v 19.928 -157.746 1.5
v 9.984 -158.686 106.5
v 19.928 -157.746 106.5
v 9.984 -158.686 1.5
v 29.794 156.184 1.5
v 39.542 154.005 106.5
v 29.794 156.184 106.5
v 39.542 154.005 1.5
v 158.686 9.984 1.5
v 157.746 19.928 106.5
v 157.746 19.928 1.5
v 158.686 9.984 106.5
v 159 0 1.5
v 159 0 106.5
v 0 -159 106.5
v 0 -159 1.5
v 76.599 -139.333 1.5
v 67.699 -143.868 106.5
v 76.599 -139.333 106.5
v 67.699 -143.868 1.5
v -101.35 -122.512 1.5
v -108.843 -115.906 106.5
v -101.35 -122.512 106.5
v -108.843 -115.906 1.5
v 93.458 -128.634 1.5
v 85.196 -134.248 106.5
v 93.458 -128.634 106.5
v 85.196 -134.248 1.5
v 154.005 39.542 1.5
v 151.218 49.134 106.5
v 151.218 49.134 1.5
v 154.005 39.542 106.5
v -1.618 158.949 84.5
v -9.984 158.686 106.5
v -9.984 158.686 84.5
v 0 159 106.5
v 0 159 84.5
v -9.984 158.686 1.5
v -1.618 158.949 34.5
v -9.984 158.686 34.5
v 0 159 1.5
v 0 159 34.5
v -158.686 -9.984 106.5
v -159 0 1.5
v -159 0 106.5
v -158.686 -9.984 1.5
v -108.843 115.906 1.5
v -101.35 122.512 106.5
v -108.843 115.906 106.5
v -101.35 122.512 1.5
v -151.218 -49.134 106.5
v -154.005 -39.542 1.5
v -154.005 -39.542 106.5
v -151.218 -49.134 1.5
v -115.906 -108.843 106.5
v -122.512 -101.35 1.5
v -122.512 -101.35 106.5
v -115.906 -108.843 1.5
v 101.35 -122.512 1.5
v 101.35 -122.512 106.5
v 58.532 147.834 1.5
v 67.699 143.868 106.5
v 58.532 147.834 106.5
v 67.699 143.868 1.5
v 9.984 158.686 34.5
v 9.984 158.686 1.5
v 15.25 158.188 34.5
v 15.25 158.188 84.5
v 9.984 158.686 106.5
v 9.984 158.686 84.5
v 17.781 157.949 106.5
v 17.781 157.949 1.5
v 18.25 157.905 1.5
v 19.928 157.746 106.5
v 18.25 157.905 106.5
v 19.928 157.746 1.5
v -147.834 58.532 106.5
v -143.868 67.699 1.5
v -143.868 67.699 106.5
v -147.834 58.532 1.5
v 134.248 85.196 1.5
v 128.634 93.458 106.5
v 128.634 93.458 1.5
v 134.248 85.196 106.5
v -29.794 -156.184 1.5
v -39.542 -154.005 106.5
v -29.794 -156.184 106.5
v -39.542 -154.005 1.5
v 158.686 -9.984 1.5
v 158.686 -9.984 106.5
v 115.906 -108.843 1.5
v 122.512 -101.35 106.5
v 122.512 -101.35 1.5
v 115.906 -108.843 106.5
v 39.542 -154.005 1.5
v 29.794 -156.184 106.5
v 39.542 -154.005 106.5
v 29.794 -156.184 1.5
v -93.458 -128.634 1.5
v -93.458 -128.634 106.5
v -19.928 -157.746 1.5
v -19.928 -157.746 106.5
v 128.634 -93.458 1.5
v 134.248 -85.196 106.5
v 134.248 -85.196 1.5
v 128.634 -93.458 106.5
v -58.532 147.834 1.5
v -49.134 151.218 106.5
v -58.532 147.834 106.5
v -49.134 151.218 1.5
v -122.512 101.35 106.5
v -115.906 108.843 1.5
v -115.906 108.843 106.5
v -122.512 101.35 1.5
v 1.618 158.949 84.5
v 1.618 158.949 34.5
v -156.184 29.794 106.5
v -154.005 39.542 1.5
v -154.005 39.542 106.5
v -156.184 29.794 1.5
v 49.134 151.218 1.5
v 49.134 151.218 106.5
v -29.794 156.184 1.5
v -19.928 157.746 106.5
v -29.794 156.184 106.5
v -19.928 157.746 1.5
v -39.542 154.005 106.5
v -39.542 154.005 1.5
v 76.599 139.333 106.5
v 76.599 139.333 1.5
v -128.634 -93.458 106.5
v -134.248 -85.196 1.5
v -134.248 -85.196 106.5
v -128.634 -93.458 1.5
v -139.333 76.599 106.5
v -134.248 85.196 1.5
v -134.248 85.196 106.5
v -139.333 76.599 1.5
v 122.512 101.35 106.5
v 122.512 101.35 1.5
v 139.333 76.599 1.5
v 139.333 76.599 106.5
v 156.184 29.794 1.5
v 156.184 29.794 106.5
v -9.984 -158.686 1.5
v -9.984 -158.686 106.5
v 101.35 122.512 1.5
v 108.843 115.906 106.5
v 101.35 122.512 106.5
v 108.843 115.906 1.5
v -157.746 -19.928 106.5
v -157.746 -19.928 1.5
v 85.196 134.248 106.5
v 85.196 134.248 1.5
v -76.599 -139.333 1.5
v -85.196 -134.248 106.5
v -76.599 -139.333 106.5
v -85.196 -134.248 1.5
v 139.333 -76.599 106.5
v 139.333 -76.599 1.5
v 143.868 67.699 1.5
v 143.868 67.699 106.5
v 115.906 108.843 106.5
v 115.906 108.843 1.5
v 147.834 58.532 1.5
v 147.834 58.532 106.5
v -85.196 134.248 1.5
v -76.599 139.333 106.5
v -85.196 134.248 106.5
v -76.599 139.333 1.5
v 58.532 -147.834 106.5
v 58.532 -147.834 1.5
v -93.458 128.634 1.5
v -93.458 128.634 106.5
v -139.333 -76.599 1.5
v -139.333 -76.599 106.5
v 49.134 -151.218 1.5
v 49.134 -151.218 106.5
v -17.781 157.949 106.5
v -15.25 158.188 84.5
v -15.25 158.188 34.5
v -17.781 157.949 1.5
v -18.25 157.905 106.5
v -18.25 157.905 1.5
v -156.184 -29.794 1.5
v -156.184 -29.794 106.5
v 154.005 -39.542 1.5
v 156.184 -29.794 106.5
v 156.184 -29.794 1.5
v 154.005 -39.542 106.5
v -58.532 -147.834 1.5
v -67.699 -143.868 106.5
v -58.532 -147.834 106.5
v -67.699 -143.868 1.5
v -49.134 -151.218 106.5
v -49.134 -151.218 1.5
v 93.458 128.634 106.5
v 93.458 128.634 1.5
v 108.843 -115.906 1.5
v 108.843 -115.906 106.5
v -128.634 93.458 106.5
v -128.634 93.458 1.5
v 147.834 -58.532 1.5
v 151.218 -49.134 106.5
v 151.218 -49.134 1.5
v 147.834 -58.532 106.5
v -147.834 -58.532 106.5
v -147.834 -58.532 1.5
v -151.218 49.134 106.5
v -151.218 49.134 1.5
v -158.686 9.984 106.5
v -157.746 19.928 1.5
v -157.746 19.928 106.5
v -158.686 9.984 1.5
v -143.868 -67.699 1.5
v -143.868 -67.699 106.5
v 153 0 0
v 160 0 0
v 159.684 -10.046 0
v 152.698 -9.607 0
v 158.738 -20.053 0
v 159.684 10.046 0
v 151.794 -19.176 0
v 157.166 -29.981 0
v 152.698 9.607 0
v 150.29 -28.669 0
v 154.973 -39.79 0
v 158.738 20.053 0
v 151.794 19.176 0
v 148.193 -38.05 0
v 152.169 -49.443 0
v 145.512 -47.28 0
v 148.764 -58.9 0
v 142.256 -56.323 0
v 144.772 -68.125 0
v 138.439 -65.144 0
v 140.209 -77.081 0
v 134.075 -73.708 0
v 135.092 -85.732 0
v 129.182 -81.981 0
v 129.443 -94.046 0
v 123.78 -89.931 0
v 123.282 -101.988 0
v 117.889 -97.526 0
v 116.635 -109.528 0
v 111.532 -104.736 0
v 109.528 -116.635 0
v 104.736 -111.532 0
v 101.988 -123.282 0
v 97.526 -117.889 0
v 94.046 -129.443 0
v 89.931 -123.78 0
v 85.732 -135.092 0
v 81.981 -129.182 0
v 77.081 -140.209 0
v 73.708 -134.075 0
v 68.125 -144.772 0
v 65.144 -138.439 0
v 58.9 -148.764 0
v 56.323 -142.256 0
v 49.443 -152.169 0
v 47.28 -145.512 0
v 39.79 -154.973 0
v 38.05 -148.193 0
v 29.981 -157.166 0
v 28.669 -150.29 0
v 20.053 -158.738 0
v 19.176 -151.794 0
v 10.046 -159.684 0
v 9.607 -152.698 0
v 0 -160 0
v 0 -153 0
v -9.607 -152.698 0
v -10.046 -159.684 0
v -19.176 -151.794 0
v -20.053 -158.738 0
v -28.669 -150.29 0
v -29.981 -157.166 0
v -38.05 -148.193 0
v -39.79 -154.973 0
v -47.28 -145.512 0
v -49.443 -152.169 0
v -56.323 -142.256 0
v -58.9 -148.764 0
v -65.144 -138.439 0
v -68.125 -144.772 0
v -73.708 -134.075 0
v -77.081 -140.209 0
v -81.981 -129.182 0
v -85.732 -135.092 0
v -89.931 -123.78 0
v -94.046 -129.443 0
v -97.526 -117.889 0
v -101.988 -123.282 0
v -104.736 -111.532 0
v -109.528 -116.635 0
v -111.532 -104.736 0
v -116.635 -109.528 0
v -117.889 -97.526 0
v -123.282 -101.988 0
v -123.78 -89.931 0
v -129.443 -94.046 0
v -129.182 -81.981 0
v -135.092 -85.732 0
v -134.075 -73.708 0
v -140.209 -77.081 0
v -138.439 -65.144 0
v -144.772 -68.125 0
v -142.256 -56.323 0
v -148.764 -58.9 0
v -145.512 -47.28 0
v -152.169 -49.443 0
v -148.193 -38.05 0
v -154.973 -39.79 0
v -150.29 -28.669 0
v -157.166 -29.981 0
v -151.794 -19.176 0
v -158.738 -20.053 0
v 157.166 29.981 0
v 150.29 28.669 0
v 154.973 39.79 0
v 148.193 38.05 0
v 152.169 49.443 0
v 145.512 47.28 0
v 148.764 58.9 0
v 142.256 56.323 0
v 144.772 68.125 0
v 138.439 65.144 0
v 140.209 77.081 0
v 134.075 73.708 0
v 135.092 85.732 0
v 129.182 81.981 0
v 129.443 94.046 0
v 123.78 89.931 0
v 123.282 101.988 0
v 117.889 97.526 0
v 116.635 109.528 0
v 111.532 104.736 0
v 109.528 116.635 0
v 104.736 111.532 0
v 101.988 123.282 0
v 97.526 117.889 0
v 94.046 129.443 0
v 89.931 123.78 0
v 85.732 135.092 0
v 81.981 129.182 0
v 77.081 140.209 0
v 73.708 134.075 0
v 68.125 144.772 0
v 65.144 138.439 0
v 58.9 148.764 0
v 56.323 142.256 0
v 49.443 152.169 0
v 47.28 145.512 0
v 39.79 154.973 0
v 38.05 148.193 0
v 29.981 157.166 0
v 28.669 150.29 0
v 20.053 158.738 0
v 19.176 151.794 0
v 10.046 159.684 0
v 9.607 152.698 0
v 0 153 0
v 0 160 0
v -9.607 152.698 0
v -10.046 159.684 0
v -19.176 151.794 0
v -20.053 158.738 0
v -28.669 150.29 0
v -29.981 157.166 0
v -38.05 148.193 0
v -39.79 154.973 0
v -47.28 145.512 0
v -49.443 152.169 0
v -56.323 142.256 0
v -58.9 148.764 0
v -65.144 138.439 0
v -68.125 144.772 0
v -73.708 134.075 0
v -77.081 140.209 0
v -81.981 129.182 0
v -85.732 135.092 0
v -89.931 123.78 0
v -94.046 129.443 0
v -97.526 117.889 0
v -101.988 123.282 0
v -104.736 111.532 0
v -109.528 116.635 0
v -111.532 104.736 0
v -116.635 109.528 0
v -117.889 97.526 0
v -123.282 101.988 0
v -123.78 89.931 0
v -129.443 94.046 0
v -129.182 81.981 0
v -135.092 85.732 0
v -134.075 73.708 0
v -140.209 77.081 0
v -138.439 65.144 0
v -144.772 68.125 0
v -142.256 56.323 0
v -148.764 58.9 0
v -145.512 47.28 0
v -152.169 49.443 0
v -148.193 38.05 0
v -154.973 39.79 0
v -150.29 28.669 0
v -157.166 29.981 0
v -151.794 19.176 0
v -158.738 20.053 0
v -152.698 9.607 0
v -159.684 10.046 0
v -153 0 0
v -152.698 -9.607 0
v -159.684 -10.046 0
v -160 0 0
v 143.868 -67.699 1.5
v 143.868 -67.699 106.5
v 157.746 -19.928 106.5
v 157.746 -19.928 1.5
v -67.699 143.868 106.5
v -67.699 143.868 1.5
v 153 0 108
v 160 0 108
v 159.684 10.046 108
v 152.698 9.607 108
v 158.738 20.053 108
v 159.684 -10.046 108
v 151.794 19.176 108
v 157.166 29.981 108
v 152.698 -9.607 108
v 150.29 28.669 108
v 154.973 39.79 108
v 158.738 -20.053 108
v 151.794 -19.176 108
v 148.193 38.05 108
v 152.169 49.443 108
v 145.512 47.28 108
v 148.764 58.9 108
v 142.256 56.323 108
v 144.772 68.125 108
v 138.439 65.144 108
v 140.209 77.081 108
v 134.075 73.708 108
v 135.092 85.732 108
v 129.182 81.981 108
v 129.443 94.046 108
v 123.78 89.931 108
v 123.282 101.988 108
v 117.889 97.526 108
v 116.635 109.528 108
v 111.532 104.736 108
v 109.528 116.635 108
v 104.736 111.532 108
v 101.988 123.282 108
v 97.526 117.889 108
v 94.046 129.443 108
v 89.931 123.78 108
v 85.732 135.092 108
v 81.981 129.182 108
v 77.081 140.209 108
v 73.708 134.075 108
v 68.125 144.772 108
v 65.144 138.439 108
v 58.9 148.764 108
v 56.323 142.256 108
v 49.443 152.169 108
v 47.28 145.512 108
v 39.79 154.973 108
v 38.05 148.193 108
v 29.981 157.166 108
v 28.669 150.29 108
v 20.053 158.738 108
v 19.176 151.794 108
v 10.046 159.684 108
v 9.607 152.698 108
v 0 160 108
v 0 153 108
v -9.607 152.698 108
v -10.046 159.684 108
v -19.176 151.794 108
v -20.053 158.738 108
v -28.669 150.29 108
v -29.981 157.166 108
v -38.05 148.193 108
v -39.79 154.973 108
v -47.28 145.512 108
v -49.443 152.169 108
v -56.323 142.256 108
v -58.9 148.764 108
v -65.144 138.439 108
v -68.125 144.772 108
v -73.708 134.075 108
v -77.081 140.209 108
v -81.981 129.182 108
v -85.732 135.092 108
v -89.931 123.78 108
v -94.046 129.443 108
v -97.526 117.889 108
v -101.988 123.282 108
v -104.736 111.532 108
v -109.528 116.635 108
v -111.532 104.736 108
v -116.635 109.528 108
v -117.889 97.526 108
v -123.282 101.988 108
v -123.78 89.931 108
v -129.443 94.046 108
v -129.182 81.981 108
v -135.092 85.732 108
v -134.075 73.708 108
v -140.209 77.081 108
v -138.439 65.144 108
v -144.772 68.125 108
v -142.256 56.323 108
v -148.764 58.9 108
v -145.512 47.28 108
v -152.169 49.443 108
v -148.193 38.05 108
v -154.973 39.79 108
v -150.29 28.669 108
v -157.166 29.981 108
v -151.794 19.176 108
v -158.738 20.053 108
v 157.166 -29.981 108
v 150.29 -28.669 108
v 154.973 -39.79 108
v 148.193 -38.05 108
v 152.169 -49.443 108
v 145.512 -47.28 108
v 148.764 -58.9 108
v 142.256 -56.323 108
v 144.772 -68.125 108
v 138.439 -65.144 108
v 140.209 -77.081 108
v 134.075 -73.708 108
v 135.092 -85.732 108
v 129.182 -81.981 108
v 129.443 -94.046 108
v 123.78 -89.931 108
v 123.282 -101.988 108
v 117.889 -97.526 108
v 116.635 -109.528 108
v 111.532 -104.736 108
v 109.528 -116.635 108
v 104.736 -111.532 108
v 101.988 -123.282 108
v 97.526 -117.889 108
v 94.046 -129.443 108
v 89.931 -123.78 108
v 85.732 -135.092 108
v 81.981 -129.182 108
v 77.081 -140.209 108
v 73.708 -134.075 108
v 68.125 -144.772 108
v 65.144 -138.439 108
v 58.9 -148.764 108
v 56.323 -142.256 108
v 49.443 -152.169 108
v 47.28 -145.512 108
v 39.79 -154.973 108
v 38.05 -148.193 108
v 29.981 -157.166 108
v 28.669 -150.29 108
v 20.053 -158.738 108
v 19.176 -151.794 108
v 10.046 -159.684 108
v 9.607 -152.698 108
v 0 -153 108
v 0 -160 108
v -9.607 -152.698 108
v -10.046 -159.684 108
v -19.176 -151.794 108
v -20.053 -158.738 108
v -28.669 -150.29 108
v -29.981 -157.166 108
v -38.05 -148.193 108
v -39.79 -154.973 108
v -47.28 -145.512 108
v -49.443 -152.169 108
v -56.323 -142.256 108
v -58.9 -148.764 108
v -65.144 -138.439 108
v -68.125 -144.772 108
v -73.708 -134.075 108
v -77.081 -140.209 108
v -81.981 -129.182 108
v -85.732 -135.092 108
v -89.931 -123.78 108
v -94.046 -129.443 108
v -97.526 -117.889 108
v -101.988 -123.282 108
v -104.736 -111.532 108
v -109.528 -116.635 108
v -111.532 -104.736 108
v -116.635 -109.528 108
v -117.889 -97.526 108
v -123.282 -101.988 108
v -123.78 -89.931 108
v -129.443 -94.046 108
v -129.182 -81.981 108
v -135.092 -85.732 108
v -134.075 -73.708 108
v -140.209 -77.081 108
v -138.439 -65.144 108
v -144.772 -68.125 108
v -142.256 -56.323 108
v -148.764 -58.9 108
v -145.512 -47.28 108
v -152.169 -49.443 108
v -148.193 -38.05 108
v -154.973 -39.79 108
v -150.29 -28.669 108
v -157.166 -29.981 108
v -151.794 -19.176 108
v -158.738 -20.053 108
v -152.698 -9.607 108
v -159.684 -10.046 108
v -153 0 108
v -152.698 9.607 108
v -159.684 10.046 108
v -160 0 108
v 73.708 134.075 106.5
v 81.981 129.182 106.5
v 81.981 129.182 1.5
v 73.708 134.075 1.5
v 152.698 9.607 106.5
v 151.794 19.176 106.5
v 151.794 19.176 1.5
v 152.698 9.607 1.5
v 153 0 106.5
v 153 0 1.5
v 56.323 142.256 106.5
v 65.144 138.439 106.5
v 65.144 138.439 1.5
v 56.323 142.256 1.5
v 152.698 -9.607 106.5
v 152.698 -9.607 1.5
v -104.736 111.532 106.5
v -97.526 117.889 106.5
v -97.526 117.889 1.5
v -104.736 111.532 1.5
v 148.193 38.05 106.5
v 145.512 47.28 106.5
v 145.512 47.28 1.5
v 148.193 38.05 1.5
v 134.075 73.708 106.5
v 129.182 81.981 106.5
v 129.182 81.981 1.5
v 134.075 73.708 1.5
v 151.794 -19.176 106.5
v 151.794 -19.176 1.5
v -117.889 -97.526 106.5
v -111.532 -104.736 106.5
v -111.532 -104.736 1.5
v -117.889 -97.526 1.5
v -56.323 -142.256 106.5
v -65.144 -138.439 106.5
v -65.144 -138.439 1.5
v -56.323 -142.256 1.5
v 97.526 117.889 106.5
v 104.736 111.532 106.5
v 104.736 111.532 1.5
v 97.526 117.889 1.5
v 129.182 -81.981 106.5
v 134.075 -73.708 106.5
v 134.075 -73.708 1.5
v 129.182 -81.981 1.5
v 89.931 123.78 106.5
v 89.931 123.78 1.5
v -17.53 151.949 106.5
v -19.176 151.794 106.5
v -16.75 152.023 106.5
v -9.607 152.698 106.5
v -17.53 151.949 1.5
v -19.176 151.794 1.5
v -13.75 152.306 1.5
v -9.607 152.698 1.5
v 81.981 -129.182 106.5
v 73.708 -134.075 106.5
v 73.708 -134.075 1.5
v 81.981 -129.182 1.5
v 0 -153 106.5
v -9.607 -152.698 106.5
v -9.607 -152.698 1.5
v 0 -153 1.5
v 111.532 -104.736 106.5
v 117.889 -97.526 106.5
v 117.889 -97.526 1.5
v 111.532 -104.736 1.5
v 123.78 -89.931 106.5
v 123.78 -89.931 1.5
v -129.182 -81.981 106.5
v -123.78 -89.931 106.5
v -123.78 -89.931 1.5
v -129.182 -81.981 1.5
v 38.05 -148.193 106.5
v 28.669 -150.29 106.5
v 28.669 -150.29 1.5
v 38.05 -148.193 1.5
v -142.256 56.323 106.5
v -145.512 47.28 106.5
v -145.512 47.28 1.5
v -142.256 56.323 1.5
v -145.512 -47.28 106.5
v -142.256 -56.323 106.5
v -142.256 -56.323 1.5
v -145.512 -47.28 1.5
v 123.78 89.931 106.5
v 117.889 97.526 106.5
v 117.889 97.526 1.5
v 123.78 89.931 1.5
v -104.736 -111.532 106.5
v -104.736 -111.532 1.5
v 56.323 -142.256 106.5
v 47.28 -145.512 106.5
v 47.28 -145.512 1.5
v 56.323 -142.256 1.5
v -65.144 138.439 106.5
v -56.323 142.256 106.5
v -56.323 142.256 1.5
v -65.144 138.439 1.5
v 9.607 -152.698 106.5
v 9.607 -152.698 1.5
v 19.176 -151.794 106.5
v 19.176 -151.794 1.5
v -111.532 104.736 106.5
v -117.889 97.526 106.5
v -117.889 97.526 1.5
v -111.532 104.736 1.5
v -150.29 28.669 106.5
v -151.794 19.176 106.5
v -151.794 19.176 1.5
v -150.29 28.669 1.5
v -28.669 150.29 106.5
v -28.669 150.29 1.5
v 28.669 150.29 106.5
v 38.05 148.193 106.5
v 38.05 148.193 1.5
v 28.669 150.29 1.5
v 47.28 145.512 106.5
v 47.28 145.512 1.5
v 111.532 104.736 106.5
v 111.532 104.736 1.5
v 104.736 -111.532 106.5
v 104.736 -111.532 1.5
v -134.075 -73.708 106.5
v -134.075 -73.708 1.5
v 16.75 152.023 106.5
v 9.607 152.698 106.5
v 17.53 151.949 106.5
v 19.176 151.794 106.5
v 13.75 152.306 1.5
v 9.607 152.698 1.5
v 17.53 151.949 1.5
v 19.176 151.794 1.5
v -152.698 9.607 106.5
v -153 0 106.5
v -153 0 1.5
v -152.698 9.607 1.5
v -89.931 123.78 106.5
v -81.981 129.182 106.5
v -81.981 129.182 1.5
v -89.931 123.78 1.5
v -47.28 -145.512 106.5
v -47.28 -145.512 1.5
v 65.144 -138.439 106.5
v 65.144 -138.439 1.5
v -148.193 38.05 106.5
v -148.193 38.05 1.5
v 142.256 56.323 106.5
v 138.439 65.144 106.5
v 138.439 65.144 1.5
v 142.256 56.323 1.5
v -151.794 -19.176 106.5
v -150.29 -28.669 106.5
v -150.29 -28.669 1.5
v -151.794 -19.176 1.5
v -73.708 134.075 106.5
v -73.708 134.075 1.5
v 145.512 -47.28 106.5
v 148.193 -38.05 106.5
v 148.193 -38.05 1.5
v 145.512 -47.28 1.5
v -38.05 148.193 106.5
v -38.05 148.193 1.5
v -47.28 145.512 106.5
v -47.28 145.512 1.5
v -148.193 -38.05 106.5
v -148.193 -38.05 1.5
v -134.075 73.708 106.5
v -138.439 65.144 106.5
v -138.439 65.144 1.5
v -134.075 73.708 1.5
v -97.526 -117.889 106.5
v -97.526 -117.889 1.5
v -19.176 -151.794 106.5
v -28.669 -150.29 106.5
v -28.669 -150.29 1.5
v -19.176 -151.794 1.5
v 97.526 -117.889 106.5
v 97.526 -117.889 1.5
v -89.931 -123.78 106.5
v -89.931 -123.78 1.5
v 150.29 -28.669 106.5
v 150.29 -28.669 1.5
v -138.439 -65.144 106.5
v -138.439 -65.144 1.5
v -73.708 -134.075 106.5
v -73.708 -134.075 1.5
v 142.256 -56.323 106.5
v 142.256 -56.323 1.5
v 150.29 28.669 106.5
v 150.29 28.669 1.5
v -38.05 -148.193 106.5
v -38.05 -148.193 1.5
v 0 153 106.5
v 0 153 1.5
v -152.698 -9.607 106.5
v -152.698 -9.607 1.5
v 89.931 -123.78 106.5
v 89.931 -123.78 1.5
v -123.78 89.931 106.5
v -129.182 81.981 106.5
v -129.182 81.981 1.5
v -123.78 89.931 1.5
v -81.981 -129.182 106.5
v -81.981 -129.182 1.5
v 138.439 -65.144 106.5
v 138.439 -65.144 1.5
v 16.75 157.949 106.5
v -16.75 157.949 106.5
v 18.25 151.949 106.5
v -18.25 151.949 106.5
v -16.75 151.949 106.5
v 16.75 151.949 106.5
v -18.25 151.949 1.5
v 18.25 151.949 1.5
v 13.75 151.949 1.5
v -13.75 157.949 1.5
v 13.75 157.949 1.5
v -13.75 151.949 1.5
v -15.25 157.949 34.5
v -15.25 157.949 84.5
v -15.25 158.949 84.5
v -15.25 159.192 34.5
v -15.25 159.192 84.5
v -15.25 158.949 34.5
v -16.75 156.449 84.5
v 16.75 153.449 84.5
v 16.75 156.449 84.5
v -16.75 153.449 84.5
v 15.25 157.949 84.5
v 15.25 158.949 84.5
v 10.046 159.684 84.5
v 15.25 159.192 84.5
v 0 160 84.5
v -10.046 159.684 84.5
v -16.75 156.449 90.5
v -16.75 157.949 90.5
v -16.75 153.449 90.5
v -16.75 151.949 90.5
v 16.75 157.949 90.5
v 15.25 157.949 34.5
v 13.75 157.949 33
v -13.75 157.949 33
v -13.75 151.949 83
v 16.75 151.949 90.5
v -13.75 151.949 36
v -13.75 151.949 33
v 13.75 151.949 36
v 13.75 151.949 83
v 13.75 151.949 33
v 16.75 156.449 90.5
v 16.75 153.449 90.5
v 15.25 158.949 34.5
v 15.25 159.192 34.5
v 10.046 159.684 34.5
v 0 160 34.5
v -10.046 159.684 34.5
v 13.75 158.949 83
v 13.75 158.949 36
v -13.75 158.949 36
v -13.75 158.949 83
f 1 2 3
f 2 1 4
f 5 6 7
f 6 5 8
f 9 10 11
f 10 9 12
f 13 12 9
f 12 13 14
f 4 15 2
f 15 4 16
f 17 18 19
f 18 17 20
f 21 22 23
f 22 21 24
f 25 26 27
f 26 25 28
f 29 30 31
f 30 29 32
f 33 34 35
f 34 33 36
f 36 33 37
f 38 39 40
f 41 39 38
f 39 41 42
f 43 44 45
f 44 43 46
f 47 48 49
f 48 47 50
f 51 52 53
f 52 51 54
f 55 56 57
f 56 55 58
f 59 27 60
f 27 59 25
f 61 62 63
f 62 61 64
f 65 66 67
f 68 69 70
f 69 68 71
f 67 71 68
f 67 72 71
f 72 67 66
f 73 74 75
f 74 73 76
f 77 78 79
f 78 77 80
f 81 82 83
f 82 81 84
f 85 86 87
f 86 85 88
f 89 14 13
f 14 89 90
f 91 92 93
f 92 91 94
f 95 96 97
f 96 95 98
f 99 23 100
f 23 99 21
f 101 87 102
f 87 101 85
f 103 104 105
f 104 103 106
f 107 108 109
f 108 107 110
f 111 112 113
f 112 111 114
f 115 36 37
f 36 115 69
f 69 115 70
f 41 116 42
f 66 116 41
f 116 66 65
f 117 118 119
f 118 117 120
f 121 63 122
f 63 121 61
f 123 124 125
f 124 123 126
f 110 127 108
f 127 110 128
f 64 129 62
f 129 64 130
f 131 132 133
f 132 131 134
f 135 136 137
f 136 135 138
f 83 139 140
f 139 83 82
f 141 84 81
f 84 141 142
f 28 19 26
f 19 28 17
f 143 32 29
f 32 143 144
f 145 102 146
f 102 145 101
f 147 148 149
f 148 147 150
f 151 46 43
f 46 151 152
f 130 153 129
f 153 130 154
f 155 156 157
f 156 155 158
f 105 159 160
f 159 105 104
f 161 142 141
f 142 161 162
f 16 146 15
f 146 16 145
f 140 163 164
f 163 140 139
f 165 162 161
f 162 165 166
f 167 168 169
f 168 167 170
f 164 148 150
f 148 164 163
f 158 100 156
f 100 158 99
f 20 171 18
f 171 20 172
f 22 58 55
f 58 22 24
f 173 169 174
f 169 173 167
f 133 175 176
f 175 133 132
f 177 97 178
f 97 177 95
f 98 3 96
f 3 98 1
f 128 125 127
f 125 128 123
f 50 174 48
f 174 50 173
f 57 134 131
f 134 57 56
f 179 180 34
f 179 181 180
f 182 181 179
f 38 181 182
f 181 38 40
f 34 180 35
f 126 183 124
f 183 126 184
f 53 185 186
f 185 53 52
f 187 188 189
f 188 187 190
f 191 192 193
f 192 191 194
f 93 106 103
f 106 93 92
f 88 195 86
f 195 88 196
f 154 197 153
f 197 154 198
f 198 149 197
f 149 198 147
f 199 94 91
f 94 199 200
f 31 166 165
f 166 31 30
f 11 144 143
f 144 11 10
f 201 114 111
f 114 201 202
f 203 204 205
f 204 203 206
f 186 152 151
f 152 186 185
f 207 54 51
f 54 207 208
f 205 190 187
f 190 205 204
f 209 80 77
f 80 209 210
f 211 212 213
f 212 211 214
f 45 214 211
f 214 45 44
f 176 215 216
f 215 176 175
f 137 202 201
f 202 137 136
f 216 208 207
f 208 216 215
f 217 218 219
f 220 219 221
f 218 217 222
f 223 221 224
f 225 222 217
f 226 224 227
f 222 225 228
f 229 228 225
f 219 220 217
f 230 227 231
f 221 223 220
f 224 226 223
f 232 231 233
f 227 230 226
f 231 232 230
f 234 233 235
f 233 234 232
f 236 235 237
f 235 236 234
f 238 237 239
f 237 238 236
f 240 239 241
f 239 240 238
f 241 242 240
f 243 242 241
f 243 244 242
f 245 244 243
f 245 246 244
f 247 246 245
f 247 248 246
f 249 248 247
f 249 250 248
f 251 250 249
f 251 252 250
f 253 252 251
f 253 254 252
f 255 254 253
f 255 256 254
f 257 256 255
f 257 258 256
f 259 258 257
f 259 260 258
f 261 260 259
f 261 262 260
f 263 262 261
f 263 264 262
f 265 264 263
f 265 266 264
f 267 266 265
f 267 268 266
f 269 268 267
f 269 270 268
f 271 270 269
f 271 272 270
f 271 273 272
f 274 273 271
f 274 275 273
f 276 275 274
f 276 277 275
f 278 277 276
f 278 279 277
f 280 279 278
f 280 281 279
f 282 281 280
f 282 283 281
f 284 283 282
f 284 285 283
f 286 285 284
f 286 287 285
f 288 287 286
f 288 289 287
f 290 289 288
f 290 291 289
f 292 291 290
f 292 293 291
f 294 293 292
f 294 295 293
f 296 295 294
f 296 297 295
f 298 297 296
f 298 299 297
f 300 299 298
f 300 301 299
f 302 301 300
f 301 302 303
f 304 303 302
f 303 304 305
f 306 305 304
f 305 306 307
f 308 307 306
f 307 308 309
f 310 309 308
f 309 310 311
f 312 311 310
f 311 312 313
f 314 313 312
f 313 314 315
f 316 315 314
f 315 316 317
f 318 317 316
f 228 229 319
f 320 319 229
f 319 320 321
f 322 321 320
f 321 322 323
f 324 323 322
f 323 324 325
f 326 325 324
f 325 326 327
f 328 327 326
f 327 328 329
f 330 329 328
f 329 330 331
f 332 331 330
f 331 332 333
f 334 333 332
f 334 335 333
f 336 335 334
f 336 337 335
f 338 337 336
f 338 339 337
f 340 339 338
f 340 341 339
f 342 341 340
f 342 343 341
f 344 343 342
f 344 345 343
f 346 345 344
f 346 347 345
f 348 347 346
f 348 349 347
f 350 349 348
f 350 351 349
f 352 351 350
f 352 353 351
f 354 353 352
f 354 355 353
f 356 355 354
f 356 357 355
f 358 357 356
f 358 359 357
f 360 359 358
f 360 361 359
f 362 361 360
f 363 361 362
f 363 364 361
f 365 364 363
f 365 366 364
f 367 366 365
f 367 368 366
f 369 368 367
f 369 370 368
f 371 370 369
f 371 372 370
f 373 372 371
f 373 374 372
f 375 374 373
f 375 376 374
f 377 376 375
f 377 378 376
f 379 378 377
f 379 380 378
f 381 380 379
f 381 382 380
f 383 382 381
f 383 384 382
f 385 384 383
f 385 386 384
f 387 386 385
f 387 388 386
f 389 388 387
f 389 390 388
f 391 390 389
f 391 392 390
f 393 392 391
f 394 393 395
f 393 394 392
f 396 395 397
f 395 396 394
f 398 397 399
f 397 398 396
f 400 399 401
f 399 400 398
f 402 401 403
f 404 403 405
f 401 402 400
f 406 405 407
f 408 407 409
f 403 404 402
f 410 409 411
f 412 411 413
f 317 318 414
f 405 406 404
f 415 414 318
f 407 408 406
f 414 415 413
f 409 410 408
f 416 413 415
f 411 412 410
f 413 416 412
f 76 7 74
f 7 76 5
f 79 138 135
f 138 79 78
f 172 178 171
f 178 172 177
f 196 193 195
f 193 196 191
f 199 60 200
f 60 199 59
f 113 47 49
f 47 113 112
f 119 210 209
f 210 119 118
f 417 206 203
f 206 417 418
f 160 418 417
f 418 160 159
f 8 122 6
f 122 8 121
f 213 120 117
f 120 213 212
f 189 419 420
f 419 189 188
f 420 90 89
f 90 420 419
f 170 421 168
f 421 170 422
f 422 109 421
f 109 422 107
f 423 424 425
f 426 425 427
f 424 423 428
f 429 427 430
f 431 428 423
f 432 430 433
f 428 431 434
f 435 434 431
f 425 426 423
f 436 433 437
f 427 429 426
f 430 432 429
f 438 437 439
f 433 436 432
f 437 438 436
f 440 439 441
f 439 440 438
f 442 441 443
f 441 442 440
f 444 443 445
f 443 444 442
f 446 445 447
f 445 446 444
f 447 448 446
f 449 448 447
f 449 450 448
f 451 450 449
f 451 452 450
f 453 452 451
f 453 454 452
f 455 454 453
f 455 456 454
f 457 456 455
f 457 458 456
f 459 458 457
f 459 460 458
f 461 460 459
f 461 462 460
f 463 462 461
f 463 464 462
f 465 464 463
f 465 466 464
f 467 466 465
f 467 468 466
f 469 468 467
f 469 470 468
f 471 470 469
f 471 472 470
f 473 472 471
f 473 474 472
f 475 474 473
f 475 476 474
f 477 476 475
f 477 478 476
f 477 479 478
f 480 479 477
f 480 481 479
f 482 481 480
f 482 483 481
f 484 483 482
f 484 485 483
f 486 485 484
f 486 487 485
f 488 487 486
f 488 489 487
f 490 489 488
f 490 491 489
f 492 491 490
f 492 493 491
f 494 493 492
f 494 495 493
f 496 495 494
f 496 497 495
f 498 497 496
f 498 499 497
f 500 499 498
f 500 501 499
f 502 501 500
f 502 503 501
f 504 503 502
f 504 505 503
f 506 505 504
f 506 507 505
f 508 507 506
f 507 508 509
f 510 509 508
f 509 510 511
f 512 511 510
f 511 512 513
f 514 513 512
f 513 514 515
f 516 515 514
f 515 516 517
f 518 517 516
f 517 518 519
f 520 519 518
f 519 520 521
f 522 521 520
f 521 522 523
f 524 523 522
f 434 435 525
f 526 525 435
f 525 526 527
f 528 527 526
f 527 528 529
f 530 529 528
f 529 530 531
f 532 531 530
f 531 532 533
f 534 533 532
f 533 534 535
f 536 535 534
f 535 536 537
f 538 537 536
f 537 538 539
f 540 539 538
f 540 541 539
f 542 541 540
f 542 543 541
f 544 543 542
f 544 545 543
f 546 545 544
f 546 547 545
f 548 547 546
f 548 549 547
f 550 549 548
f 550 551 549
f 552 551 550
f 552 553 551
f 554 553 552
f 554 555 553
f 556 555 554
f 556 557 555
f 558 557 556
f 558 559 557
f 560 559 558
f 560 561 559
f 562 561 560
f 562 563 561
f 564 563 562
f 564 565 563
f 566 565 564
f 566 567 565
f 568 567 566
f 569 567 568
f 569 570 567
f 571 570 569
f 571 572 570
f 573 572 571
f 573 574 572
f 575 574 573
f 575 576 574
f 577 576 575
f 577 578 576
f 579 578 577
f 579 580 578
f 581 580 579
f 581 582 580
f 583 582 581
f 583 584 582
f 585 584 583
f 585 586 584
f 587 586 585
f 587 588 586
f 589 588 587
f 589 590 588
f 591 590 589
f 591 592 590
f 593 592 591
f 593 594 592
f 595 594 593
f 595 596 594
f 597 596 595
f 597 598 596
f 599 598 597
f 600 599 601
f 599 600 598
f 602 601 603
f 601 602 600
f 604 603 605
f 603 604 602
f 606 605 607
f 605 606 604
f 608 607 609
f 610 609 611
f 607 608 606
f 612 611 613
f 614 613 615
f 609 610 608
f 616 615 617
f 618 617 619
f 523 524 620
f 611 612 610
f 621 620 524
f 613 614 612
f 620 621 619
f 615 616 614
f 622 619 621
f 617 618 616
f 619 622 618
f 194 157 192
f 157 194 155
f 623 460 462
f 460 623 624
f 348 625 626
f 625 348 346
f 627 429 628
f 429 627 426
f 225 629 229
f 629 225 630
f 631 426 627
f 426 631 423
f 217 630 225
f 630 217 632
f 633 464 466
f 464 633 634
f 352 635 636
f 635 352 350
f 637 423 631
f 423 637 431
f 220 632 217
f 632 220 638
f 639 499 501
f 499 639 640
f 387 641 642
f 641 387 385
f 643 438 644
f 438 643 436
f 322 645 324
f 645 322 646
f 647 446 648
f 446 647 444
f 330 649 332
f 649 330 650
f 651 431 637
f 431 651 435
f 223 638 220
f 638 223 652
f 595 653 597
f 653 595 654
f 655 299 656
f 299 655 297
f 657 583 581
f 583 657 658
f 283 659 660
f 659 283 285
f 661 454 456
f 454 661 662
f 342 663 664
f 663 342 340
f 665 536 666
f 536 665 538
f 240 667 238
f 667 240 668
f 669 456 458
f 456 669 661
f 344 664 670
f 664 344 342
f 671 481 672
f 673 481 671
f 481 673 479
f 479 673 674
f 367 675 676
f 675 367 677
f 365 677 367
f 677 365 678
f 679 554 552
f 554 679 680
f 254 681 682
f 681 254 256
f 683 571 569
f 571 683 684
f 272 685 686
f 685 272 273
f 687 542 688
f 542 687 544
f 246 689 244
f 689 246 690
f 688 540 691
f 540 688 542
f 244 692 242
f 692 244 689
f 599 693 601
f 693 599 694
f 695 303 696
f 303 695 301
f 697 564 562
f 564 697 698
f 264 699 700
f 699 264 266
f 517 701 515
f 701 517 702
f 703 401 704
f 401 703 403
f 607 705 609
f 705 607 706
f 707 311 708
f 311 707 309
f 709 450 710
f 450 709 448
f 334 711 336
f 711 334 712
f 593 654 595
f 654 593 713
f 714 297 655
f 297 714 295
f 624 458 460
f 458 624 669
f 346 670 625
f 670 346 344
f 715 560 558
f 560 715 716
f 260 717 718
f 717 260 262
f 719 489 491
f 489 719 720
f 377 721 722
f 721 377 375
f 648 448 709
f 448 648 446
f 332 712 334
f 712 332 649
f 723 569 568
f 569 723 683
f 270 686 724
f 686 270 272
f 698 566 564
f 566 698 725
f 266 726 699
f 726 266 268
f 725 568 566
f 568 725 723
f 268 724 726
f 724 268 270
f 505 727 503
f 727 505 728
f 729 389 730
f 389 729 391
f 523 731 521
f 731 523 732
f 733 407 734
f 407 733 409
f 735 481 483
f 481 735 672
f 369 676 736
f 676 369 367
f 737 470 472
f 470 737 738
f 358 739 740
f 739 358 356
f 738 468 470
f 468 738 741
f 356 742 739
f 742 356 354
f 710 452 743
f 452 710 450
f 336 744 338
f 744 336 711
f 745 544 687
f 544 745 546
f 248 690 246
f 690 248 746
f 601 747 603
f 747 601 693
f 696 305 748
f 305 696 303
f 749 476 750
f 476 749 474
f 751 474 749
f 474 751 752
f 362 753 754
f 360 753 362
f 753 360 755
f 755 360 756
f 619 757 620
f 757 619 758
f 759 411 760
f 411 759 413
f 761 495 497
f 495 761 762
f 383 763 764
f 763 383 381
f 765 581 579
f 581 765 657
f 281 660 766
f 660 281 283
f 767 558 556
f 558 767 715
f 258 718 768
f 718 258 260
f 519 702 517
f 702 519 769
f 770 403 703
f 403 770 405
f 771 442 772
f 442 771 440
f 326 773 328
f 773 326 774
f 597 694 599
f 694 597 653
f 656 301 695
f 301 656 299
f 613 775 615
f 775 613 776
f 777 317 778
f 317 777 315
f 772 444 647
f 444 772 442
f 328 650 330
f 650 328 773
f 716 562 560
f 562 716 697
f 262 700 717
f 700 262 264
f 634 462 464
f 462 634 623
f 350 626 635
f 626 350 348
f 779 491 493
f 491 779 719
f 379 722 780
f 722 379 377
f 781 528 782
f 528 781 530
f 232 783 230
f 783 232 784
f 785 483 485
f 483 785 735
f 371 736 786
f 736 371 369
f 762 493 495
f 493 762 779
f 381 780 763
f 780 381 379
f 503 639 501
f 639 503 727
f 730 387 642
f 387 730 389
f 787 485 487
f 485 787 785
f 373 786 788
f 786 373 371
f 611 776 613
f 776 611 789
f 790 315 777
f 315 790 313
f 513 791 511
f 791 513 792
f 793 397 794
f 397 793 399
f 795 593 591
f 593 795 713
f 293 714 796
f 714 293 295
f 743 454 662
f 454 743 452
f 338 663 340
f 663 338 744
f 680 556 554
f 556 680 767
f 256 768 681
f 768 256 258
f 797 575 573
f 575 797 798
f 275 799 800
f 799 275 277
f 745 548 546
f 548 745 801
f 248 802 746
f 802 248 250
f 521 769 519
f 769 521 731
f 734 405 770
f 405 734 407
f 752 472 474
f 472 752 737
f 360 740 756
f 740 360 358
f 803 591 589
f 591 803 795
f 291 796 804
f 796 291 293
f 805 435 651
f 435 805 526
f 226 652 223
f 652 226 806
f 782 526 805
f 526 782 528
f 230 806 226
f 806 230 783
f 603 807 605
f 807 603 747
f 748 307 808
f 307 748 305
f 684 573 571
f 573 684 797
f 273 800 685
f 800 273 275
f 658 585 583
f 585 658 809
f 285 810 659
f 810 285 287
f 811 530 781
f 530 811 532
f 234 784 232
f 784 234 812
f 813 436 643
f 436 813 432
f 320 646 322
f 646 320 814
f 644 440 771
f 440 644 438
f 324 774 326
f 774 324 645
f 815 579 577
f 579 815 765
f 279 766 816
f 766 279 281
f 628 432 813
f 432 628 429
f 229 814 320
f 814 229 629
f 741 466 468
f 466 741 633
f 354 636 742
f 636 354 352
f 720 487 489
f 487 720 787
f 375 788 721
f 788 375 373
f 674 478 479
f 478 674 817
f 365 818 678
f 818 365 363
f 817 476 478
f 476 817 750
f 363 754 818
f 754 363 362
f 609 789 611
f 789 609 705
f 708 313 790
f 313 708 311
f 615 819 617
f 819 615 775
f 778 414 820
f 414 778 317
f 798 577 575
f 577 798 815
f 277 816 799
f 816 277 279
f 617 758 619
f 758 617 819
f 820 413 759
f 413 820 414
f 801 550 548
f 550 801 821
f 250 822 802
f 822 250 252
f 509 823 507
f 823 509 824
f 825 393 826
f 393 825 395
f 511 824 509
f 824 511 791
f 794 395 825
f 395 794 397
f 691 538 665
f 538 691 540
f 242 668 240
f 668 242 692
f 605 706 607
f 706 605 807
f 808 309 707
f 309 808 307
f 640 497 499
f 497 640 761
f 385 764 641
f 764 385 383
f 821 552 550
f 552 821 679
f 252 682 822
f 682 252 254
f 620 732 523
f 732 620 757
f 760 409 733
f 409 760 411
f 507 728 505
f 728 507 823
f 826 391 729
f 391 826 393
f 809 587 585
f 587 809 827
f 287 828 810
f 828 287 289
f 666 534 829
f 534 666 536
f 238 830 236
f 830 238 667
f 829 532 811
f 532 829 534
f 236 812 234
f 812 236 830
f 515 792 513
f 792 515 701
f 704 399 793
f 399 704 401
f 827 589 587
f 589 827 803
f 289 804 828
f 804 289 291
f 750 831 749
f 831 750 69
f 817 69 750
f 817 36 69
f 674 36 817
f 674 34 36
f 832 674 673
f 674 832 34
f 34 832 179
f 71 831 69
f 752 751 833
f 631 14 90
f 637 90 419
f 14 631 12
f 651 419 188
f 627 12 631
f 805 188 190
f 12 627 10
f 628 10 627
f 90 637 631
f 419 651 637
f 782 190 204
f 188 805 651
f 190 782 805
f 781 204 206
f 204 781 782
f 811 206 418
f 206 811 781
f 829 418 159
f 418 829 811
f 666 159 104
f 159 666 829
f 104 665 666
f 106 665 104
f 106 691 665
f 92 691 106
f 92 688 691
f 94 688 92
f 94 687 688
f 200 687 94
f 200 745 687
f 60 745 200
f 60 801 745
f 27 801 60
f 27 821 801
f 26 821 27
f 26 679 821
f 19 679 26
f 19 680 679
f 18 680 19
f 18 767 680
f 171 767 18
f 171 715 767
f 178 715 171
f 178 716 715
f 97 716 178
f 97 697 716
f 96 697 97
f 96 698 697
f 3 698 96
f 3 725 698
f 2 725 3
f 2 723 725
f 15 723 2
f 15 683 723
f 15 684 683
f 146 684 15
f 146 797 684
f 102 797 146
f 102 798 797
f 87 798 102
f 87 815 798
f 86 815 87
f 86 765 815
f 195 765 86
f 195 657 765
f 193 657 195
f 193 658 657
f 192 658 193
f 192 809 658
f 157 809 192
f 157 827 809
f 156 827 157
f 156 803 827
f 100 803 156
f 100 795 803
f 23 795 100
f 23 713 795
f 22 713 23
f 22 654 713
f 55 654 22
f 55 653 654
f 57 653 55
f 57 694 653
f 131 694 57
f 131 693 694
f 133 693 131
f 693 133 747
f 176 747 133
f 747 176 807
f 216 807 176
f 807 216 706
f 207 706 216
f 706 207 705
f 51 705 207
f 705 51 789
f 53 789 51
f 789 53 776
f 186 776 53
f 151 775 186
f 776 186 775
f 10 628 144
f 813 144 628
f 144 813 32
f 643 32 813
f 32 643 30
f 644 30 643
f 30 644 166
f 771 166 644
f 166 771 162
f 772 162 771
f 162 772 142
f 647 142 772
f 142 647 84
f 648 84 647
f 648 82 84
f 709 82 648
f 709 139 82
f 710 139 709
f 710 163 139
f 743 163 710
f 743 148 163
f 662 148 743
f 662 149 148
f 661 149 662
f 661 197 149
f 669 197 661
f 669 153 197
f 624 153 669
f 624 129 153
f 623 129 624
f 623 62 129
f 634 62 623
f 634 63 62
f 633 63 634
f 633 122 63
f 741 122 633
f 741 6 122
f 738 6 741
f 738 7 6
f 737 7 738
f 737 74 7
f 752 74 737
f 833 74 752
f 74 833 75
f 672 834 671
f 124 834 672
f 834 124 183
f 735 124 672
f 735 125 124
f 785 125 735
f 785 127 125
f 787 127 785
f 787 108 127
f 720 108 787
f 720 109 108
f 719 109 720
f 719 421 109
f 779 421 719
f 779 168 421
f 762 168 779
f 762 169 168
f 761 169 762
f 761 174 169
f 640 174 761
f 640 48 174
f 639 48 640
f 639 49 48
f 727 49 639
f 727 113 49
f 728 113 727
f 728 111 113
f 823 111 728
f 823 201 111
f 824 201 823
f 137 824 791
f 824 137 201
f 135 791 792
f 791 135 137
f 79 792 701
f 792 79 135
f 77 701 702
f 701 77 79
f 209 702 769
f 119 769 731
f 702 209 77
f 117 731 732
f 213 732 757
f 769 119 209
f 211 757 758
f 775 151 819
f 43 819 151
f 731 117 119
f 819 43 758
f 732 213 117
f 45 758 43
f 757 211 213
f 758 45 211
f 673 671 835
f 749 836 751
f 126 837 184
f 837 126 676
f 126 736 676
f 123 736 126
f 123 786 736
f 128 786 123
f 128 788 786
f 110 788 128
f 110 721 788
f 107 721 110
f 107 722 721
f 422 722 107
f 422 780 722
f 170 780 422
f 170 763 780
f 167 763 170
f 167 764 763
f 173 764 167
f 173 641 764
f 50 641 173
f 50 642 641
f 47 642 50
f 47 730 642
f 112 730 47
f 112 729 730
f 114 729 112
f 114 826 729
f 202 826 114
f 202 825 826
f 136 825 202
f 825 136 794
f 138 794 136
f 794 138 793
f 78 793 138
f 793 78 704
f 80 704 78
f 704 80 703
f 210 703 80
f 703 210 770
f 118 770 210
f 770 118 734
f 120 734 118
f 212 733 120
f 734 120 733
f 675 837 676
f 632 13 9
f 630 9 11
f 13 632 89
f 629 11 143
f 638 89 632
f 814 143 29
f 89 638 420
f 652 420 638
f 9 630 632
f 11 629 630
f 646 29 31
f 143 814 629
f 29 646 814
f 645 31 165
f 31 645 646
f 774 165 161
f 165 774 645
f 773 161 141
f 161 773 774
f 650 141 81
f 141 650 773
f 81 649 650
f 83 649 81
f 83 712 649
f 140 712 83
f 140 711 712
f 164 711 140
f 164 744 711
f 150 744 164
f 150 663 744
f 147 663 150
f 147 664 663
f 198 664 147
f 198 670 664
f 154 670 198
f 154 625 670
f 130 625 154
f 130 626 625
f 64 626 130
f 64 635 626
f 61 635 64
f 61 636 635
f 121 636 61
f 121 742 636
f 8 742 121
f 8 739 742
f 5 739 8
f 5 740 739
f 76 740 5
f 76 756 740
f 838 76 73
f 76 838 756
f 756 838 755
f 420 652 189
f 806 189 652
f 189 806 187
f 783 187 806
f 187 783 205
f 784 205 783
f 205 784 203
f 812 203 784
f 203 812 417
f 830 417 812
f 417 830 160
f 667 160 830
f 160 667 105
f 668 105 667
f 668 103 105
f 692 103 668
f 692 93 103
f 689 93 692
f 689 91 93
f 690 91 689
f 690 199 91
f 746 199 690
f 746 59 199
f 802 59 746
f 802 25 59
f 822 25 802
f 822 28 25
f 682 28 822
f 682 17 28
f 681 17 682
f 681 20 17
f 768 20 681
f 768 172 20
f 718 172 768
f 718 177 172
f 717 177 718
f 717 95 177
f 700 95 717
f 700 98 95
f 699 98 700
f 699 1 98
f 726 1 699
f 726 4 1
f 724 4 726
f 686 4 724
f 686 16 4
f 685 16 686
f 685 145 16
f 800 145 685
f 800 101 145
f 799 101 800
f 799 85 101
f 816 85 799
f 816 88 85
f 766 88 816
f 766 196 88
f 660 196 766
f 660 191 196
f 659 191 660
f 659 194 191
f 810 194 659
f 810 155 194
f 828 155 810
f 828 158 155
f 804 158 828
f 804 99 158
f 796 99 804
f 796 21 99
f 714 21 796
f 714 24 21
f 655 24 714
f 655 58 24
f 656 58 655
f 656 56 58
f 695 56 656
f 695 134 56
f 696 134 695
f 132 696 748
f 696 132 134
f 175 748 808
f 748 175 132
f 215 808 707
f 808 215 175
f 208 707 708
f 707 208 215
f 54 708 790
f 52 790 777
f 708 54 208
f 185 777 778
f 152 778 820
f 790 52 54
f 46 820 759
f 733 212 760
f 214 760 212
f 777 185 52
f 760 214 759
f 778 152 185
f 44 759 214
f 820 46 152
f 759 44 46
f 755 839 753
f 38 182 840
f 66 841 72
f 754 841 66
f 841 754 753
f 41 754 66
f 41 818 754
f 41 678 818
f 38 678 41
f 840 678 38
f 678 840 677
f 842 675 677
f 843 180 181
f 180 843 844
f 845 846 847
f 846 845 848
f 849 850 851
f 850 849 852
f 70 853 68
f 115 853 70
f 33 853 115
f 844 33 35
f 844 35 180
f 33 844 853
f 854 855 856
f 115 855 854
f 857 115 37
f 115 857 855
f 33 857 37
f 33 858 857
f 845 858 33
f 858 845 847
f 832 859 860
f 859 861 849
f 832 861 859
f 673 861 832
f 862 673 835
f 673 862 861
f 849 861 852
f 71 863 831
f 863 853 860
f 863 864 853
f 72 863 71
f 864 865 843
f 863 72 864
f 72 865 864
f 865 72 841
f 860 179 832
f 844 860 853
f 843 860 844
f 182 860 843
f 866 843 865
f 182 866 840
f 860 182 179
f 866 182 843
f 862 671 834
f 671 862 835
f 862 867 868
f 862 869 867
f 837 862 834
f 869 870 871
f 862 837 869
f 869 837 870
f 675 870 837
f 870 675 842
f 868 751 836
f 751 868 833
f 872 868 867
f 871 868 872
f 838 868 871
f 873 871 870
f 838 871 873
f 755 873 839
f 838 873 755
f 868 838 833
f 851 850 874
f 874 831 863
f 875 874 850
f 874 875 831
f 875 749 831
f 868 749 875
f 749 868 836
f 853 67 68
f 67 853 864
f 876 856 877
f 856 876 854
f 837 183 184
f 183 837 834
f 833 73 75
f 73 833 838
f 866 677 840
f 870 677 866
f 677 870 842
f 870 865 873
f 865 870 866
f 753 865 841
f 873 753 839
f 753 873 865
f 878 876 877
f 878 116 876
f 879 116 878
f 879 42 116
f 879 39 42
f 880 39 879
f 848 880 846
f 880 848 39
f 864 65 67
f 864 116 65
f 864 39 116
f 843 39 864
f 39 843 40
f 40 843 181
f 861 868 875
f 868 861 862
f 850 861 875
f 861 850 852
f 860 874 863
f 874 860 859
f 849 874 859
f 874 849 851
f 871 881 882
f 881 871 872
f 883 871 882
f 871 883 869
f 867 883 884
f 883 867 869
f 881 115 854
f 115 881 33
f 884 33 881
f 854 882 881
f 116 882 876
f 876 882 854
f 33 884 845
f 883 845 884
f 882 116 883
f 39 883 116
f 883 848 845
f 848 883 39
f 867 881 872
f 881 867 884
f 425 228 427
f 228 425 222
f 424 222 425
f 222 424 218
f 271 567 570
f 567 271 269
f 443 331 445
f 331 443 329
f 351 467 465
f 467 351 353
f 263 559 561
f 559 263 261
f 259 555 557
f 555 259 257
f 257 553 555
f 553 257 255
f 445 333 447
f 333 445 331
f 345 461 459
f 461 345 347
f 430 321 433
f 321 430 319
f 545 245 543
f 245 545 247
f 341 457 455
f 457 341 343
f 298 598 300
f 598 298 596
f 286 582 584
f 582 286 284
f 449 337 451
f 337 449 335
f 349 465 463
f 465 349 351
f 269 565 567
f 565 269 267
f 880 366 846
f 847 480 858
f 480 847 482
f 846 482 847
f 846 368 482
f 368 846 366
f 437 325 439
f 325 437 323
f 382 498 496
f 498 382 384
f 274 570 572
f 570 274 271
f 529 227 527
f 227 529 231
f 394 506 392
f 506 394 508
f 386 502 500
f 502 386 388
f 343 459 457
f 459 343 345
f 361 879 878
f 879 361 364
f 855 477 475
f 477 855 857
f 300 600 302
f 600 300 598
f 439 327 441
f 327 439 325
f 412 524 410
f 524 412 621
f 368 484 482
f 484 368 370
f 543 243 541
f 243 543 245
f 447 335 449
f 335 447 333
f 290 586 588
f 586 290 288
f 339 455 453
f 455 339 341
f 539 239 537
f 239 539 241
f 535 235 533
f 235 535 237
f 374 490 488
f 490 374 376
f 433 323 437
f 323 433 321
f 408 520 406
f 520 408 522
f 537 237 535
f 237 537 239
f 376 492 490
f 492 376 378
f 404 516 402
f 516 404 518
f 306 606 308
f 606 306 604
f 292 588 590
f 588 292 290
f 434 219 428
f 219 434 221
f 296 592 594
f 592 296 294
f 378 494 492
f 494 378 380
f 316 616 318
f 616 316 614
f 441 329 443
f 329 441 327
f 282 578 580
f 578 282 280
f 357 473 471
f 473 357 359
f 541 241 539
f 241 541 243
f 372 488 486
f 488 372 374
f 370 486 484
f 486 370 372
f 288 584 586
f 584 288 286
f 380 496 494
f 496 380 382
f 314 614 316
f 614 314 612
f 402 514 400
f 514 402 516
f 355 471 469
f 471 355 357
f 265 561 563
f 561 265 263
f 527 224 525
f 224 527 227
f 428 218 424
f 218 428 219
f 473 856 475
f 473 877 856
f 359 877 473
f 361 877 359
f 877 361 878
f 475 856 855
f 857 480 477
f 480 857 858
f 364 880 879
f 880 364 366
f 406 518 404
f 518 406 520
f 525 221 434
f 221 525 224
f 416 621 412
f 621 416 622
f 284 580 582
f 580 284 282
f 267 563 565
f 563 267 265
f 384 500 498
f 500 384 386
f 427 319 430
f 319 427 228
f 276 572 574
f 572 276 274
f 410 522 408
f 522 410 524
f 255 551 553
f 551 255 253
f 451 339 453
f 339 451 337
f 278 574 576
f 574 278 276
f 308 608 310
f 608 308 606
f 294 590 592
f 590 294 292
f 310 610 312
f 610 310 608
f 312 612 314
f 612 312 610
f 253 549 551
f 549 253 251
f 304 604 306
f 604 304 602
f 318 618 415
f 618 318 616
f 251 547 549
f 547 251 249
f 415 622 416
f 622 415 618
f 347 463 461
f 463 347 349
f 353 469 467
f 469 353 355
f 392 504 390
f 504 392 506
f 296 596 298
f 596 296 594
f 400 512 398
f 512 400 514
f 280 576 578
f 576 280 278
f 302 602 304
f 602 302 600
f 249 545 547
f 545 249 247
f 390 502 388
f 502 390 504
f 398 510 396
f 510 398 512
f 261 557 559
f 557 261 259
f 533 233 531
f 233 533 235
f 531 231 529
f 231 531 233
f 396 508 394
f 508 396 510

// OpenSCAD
$fn = 100;

bin_d = 26.5*12;
wall_h = 9*12;
wall_thickness = 6;
window_w = 27.5;
window_h = 47;
window_depth_behind = 2 + 7/16;
window_depth_infront = 7/8;
window_flange_width = 1 + 1/4;
studs_on_center = 16;
stud_thickness = 1.5;
window_elevation = 36;
header_h = 6;
corrugation_thickness = 1;

module wall_plates() {
    inner_circ = PI * (bin_d - 2*wall_thickness);
    stud_dtheta = 16 / inner_circ * 360;
    nstuds = ceil(inner_circ / 16);
    color("lightgray") difference(convexity=10) {
        cylinder(h=wall_h, d=bin_d);
        translate([0,0,-.5]) cylinder(h = wall_h + 1, d=bin_d - 2*wall_thickness);
        translate([0,0,stud_thickness]) cylinder(h=wall_h - 2*stud_thickness, d=bin_d+1);
    }
//    for (i = [0:nstuds - 1]) {
//        rotate(i*stud_dtheta) translate([bin_d/2 - wall_thickness, stud_thickness/2, 0]) cube([wall_thickness, stud_thickness, wall_h]);
//    }
}
module wall() {
    difference(convexity=10) {
        cylinder(h=wall_h, d=bin_d+2*corrugation_thickness);
        translate([0,0,-.5]) cylinder(h = wall_h + 1, d=bin_d);
    }
}

module window_frame() {
    window_h_big = window_h + 2*stud_thickness;
    window_w_big = window_w + 2*stud_thickness;
    window_elevation_big = window_elevation - stud_thickness;
    
    cripple_h = window_elevation_big - 2*stud_thickness;
    jack_h = window_elevation_big + window_h_big - stud_thickness;
    king_h = wall_h - 2*stud_thickness;
    color1 = "red";
    color2 = "green";
    color3 = "blue";
    
    translate([-2*stud_thickness - window_w/2,-wall_thickness,stud_thickness]) group() {
        // jack studs
        color(color1) cube([stud_thickness, wall_thickness, jack_h]);
        color(color1) translate([window_w_big + stud_thickness, 0, 0]) cube([stud_thickness, wall_thickness, jack_h]);
        // king studs
        color(color2) translate([-stud_thickness,0,0]) cube([stud_thickness, wall_thickness, king_h]);
        color(color2) translate([window_w_big + 2*stud_thickness,0,0]) cube([stud_thickness, wall_thickness, king_h]);
        // sill cripples
        color(color3) translate([stud_thickness, 0, 0]) cube([stud_thickness, wall_thickness, cripple_h]);
        color(color3) translate([window_w_big, 0, 0]) cube([stud_thickness, wall_thickness, cripple_h]);
        // sill
        color(color2) translate([stud_thickness, 0, cripple_h]) cube([window_w_big, wall_thickness, stud_thickness]);
        //header
        color(color3) translate([0, 0, jack_h]) cube([window_w_big+2*stud_thickness, stud_thickness, wall_thickness]);
        color(color3) translate([0, wall_thickness-stud_thickness, jack_h]) cube([window_w_big+2*stud_thickness, stud_thickness, wall_thickness]);
        
        // wide frame
        //overhang = bin_d / 2 - 1/2*sqrt(bin_d^2 - (window_w + 6 * stud_thickness)^2) + corrugation_thickness;
        overhang = corrugation_thickness;
        echo("overhang: ", overhang);
        frame_thickness = wall_thickness + overhang;
        color(color1) translate([2*stud_thickness, 0, cripple_h+stud_thickness]) cube([window_w_big-2*stud_thickness, frame_thickness, stud_thickness]);
        color(color2) translate([stud_thickness, 0, jack_h - stud_thickness]) cube([window_w_big, frame_thickness, stud_thickness]);
        color(color3) translate([stud_thickness, 0, cripple_h + stud_thickness]) cube([stud_thickness, frame_thickness, window_h + stud_thickness]);
        color(color3) translate([window_w_big, 0, cripple_h + stud_thickness]) cube([stud_thickness, frame_thickness, window_h + stud_thickness]);
    }
}

module window_hole() {
    w = window_w + 2*stud_thickness;
    h = window_h + 2*stud_thickness;
    translate([-w / 2, 0, window_elevation - stud_thickness]) cube([w, wall_thickness * 2, h]);
}


wall_plates();
offset = bin_d/2 - 1/2*sqrt(bin_d^2 - (window_w + 6*stud_thickness)^2);
translate([0, bin_d/2 - offset, 0]) window_frame();
difference(convexity=10) {
    wall();
    translate([0, bin_d/2 - wall_thickness/2, 0]) window_hole();
}
